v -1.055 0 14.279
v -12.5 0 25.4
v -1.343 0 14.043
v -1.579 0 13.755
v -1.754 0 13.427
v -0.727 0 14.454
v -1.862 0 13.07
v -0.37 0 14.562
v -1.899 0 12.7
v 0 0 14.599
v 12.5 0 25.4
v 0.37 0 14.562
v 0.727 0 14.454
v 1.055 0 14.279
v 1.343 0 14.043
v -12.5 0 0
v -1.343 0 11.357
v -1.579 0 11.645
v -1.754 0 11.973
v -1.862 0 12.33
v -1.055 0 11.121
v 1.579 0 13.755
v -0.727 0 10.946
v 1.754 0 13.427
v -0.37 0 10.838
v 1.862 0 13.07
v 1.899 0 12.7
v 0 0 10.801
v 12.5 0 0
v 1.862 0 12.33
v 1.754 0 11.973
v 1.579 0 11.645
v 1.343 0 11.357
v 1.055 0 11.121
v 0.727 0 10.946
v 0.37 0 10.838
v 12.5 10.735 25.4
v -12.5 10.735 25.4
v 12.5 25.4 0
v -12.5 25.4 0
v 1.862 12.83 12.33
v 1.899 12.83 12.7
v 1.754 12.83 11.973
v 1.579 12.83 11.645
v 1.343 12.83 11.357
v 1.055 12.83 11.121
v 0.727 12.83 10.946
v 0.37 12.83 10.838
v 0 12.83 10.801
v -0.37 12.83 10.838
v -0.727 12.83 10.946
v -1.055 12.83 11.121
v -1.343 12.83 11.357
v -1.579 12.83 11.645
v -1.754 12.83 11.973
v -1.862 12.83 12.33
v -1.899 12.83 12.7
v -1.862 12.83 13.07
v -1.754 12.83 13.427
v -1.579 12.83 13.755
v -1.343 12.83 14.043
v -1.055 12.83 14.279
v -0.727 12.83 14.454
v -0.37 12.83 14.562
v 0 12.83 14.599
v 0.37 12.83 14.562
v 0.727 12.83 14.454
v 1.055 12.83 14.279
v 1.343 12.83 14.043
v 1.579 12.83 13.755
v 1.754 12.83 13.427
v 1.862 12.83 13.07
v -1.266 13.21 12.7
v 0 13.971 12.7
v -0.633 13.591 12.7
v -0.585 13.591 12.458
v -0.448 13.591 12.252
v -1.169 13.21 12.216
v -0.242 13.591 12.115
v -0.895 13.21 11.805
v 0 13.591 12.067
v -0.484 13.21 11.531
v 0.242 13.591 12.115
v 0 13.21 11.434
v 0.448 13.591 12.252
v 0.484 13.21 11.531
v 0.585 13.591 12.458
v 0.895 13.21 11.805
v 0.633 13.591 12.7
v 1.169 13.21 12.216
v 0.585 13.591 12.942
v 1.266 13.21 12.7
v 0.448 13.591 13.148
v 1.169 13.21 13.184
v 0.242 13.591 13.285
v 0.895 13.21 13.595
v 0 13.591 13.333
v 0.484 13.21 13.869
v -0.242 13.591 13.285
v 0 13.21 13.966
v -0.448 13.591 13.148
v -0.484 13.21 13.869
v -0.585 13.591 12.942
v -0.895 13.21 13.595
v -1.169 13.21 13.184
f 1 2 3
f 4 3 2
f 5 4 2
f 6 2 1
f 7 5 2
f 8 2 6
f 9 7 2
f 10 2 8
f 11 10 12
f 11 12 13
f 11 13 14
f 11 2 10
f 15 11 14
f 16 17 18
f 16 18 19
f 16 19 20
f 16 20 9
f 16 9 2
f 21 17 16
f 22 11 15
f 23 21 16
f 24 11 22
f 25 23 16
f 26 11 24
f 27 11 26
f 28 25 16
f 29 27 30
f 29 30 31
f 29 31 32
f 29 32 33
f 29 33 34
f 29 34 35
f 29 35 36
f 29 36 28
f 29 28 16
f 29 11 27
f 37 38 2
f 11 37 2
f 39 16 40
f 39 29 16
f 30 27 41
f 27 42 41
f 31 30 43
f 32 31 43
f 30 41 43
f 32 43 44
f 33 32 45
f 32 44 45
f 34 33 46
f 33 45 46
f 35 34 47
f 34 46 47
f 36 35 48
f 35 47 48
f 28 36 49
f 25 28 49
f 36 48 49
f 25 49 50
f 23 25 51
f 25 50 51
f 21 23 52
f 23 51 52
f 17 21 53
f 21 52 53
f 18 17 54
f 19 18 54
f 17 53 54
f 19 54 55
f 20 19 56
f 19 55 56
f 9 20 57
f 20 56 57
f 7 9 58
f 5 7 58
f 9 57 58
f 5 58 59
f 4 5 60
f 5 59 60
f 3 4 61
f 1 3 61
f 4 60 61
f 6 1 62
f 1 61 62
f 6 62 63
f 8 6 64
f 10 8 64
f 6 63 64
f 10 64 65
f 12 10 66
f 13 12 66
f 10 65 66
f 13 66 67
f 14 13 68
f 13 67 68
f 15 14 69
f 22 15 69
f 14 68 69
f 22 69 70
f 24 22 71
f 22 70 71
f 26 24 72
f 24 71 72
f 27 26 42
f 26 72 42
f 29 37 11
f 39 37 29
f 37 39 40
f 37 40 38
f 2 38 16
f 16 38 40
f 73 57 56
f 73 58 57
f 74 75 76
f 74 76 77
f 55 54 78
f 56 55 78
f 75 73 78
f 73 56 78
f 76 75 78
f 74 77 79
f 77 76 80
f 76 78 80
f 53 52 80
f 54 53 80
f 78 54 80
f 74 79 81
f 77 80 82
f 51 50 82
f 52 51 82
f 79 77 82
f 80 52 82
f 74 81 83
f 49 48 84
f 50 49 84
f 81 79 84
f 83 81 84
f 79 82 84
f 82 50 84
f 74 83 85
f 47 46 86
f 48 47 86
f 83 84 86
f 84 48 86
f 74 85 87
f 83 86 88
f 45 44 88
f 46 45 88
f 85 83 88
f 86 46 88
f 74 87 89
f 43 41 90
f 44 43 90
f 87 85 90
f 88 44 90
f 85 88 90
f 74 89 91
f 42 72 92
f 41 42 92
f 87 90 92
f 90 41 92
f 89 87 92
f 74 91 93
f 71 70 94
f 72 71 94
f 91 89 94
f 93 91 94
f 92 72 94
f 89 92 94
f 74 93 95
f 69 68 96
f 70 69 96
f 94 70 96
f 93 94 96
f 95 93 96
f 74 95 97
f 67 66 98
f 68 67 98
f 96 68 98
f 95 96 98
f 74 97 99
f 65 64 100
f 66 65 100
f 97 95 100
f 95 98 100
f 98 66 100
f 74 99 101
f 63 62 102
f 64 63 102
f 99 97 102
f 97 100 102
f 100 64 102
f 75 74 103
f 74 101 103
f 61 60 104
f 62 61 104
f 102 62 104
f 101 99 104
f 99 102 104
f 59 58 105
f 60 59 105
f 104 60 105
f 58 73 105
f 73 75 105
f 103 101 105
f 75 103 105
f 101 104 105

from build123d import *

# Parameters (mm, degrees)
BOSS_EXTRUDE1_DEPTH        = 12.5
F_10_24_TAPPED_HOLE2_D     = 3.7973
F_10_24_TAPPED_HOLE2_DEPTH = 12.83
F_10_24_TAPPED_HOLE2_TIP   = 1.140824014


with BuildPart() as part:
    # Sketch1 → Boss-Extrude1 (new body, symmetric)
    with BuildSketch(Plane(origin=(0, 0, 0), x_dir=(0, 0, -1), z_dir=(1, 0, 0))):
        Polygon((0, 0), (0, 25.4), (-25.4, 10.735303163), (-25.4, 0), align=None)
    extrude(amount=BOSS_EXTRUDE1_DEPTH, both=True)

    # #10-24 Tapped Hole2
    with Locations(Plane(origin=(0, 0, 0), x_dir=(-1, 0, 0), z_dir=(0, -1, 0))):
        with Locations((105.780967711, 37.577069838), (0, -12.7)):
            Hole(F_10_24_TAPPED_HOLE2_D / 2, depth=F_10_24_TAPPED_HOLE2_DEPTH)
            with Locations((0, 0, -(F_10_24_TAPPED_HOLE2_DEPTH + F_10_24_TAPPED_HOLE2_TIP / 2))):  # 118° drill point
                Cone(0, F_10_24_TAPPED_HOLE2_D / 2, F_10_24_TAPPED_HOLE2_TIP, mode=Mode.SUBTRACT)


solid = part.part
